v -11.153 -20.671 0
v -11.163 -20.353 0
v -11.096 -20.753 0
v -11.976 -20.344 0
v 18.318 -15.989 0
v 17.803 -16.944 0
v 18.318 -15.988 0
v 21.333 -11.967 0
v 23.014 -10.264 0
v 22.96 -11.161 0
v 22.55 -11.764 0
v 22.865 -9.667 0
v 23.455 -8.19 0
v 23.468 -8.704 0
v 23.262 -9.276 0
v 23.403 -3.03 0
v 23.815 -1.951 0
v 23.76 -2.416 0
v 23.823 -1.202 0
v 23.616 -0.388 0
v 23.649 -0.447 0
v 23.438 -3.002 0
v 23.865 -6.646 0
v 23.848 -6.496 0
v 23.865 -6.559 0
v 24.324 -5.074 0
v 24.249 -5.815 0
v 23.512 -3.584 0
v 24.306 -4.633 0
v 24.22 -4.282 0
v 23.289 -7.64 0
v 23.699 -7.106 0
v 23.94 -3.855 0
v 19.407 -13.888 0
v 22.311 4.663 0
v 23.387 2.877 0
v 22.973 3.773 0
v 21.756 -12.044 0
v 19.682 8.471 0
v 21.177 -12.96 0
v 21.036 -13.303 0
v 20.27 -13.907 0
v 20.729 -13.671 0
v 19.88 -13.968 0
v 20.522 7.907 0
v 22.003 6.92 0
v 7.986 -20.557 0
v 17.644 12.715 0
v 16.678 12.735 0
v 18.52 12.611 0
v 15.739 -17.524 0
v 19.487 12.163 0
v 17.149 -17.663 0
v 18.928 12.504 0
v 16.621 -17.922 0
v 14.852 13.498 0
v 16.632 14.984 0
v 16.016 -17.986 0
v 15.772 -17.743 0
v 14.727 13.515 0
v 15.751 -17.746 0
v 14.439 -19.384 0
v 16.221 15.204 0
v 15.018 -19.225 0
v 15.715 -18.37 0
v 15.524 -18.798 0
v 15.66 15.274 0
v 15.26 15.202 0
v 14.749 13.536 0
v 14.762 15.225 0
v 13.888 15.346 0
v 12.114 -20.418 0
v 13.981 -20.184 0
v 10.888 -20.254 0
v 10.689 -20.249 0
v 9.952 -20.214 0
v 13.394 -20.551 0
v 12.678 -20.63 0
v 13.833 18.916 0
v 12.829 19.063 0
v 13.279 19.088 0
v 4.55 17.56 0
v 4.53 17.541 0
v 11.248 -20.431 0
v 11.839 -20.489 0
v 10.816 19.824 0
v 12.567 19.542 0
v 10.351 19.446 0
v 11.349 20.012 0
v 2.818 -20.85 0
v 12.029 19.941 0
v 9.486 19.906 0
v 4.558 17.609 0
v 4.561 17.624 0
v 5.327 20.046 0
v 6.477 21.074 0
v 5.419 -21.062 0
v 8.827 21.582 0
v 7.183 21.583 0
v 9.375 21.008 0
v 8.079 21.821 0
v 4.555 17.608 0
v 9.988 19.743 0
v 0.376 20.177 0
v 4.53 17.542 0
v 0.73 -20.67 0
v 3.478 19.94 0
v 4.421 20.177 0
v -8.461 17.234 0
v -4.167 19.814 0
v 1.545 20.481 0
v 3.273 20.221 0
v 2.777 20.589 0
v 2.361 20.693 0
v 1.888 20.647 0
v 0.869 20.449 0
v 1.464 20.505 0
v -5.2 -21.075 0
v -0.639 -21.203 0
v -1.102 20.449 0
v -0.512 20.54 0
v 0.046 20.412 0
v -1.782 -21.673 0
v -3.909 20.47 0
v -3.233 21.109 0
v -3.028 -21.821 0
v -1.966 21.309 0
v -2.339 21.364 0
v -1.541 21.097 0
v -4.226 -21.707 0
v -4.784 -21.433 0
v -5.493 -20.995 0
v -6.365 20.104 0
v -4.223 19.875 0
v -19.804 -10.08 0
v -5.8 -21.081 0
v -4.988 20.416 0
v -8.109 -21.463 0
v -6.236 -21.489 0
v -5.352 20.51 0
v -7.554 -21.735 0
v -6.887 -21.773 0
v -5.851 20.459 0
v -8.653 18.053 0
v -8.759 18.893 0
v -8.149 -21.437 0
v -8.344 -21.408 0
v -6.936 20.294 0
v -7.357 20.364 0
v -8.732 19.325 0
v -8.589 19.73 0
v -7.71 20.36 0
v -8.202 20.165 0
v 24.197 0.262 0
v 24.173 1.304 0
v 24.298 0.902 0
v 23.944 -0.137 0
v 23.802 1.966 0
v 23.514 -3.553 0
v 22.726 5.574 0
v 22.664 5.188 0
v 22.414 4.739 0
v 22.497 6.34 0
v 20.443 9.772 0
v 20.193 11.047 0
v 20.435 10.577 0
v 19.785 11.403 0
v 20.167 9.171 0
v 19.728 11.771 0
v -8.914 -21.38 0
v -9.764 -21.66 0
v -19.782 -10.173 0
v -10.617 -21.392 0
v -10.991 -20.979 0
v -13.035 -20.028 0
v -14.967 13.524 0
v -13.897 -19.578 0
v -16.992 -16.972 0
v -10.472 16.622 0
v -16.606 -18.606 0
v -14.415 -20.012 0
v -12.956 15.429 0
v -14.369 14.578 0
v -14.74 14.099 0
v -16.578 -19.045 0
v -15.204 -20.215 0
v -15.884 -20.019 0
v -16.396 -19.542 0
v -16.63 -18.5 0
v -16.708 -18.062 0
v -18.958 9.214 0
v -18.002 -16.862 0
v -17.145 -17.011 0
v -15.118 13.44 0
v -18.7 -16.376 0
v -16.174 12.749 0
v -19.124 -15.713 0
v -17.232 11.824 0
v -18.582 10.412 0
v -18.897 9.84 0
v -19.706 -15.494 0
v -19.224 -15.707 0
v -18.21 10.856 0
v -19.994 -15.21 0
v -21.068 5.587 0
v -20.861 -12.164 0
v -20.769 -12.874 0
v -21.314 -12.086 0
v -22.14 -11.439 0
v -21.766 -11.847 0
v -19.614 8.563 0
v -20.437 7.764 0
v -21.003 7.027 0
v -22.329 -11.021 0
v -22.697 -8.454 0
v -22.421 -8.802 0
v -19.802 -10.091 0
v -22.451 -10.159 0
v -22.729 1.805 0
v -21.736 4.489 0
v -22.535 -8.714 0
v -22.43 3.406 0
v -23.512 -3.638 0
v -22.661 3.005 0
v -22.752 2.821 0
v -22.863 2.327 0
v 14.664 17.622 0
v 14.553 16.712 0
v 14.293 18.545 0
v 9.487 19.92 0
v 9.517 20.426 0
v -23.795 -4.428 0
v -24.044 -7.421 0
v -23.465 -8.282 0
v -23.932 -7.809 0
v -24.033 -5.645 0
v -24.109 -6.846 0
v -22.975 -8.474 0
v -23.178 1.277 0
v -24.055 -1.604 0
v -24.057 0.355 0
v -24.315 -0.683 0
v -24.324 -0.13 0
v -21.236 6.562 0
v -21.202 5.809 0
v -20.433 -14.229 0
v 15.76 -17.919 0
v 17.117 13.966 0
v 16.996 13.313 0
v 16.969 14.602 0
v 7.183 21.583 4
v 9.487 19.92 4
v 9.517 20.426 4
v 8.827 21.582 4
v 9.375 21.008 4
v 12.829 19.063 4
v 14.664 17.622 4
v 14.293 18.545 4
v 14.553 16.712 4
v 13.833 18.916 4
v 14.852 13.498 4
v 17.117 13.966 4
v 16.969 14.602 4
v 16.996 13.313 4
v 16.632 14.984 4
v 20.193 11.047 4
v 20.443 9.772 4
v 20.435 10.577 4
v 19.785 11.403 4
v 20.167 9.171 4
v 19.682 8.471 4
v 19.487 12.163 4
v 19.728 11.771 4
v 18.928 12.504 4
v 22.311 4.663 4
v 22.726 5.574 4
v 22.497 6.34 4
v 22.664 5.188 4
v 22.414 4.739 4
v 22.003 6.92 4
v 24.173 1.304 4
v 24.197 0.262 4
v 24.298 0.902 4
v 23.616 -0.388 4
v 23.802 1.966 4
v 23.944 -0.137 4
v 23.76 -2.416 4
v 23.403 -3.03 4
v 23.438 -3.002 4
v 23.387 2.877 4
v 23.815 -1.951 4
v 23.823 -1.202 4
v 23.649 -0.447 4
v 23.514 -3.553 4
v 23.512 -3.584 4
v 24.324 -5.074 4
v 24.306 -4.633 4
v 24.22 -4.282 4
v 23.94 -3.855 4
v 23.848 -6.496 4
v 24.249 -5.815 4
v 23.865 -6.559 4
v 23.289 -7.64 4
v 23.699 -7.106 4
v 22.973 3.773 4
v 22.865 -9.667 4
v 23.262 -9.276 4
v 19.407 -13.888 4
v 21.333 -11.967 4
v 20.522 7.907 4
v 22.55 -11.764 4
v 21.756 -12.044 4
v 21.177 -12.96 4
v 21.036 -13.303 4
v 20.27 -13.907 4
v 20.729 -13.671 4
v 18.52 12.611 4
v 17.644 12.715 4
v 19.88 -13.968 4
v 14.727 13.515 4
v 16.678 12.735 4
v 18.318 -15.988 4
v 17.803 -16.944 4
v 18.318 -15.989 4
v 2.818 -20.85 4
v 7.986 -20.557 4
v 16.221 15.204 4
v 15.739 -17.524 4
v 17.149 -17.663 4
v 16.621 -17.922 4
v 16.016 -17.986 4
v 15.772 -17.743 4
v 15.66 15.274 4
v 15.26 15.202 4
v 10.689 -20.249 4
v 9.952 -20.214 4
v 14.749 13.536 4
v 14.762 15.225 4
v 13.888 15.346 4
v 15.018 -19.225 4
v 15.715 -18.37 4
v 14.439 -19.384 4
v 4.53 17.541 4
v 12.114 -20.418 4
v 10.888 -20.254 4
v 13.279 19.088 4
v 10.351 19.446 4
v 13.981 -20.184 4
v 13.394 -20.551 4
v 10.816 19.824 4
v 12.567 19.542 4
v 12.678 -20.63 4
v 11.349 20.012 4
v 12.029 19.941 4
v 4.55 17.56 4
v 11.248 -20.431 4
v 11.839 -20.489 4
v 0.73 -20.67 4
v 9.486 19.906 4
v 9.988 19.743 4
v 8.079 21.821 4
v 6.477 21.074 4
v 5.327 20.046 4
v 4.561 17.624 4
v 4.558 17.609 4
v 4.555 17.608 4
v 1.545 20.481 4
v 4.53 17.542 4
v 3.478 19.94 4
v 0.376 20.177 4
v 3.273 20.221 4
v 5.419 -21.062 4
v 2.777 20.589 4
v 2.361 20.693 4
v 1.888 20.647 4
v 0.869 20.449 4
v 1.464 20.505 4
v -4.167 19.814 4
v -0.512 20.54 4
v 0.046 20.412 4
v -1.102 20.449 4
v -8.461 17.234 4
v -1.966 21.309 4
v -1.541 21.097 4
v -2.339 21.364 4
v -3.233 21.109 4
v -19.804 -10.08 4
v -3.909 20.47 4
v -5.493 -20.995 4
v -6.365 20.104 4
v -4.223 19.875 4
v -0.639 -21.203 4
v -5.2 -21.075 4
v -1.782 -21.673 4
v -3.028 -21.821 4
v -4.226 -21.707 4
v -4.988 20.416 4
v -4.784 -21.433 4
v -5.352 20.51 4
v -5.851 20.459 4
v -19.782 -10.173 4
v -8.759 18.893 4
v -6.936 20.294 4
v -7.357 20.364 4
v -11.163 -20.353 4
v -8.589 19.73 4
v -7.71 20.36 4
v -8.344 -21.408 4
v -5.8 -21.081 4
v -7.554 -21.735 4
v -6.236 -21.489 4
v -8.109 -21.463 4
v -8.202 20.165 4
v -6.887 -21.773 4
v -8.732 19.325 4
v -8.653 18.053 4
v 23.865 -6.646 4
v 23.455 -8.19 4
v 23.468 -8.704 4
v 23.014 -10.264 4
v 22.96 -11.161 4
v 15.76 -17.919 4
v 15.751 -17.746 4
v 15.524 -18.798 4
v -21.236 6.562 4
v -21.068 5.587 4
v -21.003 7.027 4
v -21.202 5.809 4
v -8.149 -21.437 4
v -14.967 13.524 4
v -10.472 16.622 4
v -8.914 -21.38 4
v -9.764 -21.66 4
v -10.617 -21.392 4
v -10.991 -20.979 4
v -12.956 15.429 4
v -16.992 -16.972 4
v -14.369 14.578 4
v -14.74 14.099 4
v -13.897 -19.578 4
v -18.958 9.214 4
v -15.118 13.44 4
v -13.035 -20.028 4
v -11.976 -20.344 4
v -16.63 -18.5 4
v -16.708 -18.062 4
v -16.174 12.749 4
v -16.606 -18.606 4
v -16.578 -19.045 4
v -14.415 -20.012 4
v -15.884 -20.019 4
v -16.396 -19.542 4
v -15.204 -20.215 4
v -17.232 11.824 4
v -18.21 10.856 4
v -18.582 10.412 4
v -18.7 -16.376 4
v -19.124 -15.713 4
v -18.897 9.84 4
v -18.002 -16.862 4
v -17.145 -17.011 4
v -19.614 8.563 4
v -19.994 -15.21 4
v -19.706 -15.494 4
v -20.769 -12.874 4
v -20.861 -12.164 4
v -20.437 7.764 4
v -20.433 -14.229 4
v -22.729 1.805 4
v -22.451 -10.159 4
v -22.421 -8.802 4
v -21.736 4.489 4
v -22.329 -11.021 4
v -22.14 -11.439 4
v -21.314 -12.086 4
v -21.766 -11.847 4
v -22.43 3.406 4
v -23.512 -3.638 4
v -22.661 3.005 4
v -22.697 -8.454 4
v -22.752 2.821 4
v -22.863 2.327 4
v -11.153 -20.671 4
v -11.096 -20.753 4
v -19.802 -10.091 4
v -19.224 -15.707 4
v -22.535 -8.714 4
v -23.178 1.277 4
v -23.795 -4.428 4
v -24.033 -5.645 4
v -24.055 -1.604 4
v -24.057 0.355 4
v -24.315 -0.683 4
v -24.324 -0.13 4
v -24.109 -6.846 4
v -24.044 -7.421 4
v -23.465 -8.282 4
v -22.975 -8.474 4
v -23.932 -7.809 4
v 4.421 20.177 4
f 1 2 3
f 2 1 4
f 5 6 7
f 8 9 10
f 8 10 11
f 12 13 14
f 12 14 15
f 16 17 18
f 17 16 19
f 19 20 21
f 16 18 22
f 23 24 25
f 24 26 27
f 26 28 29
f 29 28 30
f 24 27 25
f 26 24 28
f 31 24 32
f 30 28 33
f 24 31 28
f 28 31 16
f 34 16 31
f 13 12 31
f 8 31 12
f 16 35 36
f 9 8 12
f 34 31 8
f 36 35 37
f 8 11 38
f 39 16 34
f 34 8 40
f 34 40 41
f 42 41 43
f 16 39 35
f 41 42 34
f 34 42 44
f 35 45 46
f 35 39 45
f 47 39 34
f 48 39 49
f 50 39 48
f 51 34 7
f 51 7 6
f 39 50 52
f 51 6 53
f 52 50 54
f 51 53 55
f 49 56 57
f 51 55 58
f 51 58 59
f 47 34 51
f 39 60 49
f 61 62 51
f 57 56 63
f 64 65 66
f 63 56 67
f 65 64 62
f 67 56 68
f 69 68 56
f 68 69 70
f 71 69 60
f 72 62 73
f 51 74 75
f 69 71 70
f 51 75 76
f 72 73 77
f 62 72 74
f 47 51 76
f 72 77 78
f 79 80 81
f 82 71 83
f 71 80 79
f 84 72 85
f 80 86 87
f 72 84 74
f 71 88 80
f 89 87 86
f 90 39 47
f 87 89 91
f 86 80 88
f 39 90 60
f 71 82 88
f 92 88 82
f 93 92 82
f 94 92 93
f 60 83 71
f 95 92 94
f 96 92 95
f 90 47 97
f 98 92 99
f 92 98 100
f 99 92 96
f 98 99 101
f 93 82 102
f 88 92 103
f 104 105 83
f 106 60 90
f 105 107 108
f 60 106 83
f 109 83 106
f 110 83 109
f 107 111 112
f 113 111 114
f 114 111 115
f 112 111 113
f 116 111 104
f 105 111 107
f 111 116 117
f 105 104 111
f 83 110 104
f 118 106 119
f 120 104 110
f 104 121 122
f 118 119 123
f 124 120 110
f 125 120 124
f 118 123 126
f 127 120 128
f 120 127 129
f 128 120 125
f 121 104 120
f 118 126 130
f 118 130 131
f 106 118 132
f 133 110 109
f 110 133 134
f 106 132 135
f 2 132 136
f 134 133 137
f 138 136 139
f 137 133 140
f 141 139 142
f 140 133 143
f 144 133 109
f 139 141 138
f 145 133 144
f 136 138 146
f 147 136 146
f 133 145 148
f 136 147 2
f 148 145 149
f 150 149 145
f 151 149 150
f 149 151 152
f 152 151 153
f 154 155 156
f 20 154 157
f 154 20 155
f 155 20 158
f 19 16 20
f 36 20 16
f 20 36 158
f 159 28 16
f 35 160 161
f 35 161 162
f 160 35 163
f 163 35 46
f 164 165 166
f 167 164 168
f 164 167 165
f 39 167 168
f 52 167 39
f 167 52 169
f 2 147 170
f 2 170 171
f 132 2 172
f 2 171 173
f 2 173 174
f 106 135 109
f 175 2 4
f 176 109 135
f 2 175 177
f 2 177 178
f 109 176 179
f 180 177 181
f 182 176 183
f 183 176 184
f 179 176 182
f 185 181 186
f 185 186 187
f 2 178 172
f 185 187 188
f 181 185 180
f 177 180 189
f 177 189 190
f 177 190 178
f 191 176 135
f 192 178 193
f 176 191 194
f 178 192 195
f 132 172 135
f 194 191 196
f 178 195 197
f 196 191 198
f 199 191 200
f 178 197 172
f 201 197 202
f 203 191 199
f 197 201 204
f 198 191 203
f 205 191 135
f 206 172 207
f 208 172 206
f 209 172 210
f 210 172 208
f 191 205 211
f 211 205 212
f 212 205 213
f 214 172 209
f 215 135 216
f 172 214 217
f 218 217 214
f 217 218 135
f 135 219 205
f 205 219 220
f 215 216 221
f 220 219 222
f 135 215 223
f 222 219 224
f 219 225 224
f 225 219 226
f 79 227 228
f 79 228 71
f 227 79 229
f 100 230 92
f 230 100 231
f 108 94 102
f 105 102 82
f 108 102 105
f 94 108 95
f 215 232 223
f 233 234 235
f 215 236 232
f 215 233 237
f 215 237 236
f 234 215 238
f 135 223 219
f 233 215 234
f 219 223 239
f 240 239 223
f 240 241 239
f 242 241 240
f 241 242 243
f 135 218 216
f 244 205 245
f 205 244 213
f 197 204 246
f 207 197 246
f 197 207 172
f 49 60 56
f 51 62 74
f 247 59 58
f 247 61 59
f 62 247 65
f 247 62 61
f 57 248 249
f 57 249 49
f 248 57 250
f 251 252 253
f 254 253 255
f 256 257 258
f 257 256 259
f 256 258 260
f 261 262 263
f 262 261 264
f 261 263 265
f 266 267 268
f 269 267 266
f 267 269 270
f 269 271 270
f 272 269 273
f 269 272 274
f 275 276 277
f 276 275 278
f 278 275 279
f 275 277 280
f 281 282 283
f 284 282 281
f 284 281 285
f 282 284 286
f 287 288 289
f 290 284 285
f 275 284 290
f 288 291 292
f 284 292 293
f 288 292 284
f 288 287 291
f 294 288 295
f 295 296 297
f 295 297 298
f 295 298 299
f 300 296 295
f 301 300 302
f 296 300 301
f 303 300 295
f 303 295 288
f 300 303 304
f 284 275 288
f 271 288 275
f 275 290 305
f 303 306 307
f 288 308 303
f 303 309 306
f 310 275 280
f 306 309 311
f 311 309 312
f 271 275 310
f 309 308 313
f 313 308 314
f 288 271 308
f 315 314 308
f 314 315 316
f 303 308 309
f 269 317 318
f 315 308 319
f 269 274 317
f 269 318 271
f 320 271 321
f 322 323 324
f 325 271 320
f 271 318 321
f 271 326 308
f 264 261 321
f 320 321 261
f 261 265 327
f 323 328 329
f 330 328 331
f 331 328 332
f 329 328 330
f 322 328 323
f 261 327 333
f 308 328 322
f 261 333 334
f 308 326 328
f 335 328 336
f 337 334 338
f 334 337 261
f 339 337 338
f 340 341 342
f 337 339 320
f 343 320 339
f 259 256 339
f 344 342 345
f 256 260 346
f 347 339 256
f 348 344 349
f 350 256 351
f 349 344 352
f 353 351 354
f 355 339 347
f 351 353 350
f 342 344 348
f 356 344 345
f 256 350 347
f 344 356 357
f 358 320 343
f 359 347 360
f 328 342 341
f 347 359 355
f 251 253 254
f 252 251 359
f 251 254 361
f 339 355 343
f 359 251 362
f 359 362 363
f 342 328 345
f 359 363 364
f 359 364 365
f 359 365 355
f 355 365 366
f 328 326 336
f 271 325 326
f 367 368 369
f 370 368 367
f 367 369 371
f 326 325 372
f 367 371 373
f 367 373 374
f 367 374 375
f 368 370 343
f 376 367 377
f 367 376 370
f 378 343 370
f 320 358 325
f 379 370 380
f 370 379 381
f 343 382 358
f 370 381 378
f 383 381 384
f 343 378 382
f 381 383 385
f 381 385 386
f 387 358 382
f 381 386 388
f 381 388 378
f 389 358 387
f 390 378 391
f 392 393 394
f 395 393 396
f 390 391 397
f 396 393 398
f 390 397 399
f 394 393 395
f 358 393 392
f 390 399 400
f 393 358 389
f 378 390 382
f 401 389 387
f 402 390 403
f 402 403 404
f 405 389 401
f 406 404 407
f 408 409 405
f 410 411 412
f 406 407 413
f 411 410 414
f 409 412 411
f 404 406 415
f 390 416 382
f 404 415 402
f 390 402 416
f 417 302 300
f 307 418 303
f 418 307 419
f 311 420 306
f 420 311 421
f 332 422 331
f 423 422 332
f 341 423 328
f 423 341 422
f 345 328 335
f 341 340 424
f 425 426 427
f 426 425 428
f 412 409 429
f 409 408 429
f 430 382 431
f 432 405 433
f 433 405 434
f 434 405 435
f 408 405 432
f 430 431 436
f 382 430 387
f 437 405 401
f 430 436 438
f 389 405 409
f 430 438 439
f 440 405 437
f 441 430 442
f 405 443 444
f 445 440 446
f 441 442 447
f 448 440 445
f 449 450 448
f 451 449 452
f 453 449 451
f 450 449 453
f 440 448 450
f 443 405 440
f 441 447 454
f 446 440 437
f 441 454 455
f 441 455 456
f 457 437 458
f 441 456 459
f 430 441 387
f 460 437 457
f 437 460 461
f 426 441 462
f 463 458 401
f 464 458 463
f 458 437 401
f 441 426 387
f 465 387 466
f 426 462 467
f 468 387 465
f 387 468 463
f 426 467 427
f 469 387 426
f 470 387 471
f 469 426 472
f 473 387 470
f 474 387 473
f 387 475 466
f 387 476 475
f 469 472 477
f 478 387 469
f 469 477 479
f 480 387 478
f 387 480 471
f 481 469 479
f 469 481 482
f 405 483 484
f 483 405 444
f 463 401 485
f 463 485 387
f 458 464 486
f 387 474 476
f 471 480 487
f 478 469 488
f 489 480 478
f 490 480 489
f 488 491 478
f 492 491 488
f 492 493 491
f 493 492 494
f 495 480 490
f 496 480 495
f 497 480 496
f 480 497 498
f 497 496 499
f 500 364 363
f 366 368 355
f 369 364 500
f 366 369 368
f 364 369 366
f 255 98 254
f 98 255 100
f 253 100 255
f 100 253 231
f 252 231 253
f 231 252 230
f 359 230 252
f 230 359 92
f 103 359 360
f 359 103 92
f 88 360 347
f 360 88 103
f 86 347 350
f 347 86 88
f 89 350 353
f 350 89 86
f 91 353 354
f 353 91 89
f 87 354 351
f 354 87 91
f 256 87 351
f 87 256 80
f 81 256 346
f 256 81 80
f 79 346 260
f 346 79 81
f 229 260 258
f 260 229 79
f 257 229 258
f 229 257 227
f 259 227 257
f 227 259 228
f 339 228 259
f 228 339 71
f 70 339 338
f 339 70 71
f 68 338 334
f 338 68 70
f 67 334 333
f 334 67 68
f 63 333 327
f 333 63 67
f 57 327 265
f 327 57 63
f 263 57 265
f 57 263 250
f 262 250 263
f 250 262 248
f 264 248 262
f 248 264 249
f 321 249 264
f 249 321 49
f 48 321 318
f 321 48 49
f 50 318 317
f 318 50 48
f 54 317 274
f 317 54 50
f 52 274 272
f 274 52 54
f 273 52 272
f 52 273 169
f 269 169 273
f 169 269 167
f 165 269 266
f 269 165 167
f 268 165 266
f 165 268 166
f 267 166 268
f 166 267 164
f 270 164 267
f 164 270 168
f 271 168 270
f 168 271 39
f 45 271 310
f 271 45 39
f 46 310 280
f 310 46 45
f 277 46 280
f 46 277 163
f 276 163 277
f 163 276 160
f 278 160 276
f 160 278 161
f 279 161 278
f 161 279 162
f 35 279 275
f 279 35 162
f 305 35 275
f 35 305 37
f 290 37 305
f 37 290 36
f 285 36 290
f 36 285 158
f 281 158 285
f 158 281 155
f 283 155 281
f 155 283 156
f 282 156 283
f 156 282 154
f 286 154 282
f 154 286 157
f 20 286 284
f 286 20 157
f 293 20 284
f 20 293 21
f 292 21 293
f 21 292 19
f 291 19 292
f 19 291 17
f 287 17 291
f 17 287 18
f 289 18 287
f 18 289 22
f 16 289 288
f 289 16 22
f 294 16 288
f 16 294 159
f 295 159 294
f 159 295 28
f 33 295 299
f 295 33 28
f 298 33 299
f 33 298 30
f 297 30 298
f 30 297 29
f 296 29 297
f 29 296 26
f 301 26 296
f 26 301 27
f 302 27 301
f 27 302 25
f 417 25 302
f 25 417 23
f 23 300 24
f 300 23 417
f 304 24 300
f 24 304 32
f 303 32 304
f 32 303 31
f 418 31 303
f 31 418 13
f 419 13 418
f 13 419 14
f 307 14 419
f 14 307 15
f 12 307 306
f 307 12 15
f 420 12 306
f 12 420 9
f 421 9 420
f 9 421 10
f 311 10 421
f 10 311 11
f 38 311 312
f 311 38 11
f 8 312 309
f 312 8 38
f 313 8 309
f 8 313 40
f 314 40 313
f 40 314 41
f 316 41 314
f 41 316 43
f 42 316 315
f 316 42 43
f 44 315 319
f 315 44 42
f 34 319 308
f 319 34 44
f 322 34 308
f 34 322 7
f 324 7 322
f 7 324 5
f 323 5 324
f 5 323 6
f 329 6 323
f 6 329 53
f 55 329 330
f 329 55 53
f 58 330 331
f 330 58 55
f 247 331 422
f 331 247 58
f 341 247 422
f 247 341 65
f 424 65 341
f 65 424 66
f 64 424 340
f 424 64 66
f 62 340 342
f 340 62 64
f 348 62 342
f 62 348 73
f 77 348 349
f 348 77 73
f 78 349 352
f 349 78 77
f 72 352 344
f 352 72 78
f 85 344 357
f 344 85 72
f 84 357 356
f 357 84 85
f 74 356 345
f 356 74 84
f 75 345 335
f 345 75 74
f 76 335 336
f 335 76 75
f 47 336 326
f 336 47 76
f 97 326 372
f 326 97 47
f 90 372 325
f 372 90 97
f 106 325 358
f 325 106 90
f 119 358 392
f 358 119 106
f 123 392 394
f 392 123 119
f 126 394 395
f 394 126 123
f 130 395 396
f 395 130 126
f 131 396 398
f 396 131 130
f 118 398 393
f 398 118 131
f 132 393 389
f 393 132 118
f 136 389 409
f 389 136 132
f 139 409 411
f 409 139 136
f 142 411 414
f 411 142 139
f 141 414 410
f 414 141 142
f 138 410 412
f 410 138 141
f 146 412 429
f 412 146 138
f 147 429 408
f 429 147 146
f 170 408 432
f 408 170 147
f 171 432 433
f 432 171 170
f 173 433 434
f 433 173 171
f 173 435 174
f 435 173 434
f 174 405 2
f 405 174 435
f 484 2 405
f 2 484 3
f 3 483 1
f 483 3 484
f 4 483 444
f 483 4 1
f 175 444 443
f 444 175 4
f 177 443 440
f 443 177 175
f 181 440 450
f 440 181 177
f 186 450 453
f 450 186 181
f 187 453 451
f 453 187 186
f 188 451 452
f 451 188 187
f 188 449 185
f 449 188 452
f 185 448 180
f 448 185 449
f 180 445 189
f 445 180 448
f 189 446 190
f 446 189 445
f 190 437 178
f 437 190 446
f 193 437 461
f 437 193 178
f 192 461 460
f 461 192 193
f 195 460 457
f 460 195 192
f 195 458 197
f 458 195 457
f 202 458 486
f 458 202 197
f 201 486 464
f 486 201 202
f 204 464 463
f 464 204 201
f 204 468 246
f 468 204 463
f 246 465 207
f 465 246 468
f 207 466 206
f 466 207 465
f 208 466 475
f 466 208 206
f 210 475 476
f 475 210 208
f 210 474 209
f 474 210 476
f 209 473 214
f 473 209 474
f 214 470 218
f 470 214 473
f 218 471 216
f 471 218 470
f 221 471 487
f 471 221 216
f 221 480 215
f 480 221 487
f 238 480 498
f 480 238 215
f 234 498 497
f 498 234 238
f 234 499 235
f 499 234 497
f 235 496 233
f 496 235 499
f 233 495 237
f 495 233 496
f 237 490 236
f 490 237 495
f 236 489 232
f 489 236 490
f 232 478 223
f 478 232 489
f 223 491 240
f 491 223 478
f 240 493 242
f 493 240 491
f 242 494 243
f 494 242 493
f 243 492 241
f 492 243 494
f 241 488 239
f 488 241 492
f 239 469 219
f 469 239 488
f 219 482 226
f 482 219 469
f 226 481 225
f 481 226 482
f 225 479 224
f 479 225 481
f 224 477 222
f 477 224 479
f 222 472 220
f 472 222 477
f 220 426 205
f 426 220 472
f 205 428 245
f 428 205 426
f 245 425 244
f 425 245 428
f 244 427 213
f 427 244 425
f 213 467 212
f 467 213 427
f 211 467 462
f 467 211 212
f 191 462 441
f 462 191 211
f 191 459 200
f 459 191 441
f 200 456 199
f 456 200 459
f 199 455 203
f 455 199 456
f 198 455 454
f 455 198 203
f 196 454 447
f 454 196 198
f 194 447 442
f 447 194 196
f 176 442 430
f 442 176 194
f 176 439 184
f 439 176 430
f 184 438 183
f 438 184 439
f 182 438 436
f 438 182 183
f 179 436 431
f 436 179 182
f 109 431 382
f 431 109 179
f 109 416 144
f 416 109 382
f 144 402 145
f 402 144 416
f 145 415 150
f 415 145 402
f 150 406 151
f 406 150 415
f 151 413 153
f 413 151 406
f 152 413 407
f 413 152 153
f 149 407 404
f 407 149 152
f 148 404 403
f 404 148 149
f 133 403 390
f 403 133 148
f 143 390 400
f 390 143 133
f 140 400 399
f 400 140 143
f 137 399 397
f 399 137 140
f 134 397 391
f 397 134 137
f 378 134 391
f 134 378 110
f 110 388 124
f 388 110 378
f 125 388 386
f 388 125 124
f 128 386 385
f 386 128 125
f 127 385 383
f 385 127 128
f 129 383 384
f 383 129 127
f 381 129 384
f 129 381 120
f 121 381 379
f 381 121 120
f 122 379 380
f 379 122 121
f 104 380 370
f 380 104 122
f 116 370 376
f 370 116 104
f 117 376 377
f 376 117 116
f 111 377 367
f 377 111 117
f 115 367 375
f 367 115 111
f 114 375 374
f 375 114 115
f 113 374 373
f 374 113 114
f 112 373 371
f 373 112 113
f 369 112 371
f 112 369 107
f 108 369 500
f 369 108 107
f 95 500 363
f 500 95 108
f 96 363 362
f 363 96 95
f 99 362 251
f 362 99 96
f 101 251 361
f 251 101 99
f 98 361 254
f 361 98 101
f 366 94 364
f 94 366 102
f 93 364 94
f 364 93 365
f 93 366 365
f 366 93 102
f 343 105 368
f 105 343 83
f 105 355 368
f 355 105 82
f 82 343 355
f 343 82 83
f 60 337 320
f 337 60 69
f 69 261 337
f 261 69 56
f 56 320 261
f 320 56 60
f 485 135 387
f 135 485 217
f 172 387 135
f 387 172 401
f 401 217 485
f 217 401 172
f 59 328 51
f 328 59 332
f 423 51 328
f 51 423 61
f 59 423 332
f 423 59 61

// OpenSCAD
// Module names are of the form poly_<inkscape-path-id>().  As a result,
// you can associate a polygon in this OpenSCAD program with the corresponding
// SVG element in the Inkscape document by looking for the XML element with
// the attribute id="inkscape-path-id".

// fudge value is used to ensure that subtracted solids are a tad taller
// in the z dimension than the polygon being subtracted from.  This helps
// keep the resulting .stl file manifold.
fudge = 0.1;

module poly_path4214(h)
{
  scale([25.4/90, -25.4/90, 1]) union()
  {
    linear_extrude(height=h)
      polygon([[-22.317605,-3.653253],[-20.591271,-5.072751],[-18.659748,-5.662958],[-16.687103,-5.546450],[-14.837400,-4.845800],[-12.163087,-2.182368],[-11.666608,-0.464734],[-11.949335,1.346747],[-13.639689,4.512762],[-15.633470,6.518622],[-17.814750,7.376043],[-20.067605,7.096747],[-22.273186,5.645575],[-23.886655,3.174872],[-24.153099,-0.022394],[-22.317605,-3.653253]]);
  }
}

module poly_path42135(h)
{
  scale([25.4/90, -25.4/90, 1]) union()
  {
    difference()
    {
       linear_extrude(height=h)
         polygon([[23.215326,-21.173031],[18.721794,-20.652231],[14.571422,-19.238917],[9.761598,-15.975809],[6.257864,-11.615638],[4.118744,-6.283054],[3.402764,-0.102709],[3.721684,3.779578],[4.691030,7.218656],[6.357589,10.324460],[8.768146,13.206926],[12.703877,16.337295],[17.584441,18.491274],[21.022420,19.108582],[25.302234,19.169522],[30.284484,18.554529],[34.318824,16.953111],[37.535937,14.163136],[40.138890,10.170658],[40.138890,10.169704],[41.454382,6.371344],[41.680770,0.479550],[41.083646,-6.321900],[39.261244,-11.865814],[36.051769,-16.250309],[31.466080,-19.542661],[27.605889,-20.839819],[23.215326,-21.173054]]);
       translate([0, 0, -fudge])
         linear_extrude(height=h+2*fudge)
           polygon([[24.062205,-16.353579],[28.743797,-15.419125],[32.130075,-13.172735],[34.623829,-9.938049],[36.229534,-5.635061],[36.951668,-0.183762],[36.985154,4.615017],[35.741452,7.881579],[34.247693,10.306018],[32.396877,12.185134],[30.165211,13.540774],[27.528906,14.394785],[23.916002,14.946966],[20.105474,14.124603],[16.070019,12.740421],[12.792899,10.183699],[10.553151,7.887717],[9.200208,5.638265],[8.533315,2.939465],[8.351719,-0.704559],[8.556397,-5.101179],[9.987712,-8.269601],[14.010300,-12.922829],[18.815121,-15.797378],[24.062205,-16.353579]]);
    }
    difference()
    {
       linear_extrude(height=h)
         polygon([[-18.114766,-20.771490],[-22.740690,-20.421124],[-26.814659,-19.324874],[-30.447211,-17.433800],[-33.748884,-14.698958],[-36.213767,-11.760528],[-37.954798,-8.512890],[-39.073504,-4.725527],[-39.671411,-0.167926],[-39.102907,7.135599],[-37.961663,10.328531],[-36.253174,13.167792],[-33.997263,15.607810],[-31.233026,17.619506],[-24.307471,20.313591],[-19.866592,20.853746],[-15.419578,20.486811],[-11.134161,19.243922],[-7.178077,17.156211],[-3.763574,14.095268],[-1.209656,10.234390],[0.489592,5.833894],[1.340087,1.154096],[1.339611,-3.577764],[0.443068,-8.133039],[-1.408047,-12.249309],[-4.272242,-15.664155],[-7.342919,-17.936483],[-10.627141,-19.526568],[-14.194544,-20.462281],[-18.114766,-20.771490]]);
       translate([0, 0, -fudge])
         linear_extrude(height=h+2*fudge)
           polygon([[-18.165997,-16.163520],[-14.353440,-15.631237],[-10.827293,-14.262083],[-7.774690,-12.105179],[-5.382764,-9.209645],[-4.021211,-6.323176],[-3.604240,-1.920371],[-3.628449,2.631234],[-4.583394,6.109572],[-7.616149,11.041807],[-12.358047,14.530808],[-17.534135,15.926792],[-23.107510,15.630158],[-28.184023,13.765830],[-31.924711,10.616922],[-33.636638,7.680202],[-34.637298,4.415053],[-34.954814,0.969970],[-34.617306,-2.506549],[-33.652896,-5.866008],[-32.089706,-8.959909],[-29.955856,-11.639757],[-27.279467,-13.757054],[-22.835210,-15.631310],[-18.165997,-16.163520]]);
    }
  }
}

module poly_path42145(h)
{
  scale([25.4/90, -25.4/90, 1]) union()
  {
    linear_extrude(height=h)
      polygon([[17.980615,5.242389],[16.486307,3.580388],[15.811422,1.676797],[15.840749,-0.299069],[16.459075,-2.177894],[19.001874,-4.967157],[20.695920,-5.538963],[22.518115,-5.336464],[25.755652,-3.787496],[27.847554,-1.884192],[28.800415,0.257118],[28.620825,2.520105],[27.268417,4.787587],[24.871337,6.508533],[21.688948,6.915836],[17.980615,5.242389]]);
  }
}

module poly_path41883(h)
{
  scale([25.4/90, -25.4/90, 1]) union()
  {
    difference()
    {
       linear_extrude(height=h)
         polygon([[28.627482,-77.317062],[25.451836,-76.476278],[22.949660,-74.670263],[18.873454,-71.030580],[15.663225,-71.494633],[12.323432,-70.655255],[11.597605,-71.650801],[9.840801,-72.952461],[8.367273,-73.320833],[6.689994,-73.157425],[5.476164,-72.569149],[5.188686,-72.654330],[3.078896,-72.458530],[1.331632,-71.491975],[0.163958,-72.326919],[-1.812996,-72.778248],[-3.904297,-72.458238],[-5.459712,-74.751895],[-6.967465,-75.504404],[-8.289287,-75.700413],[-11.454455,-74.795977],[-13.849083,-72.531883],[-14.764805,-70.205394],[-14.962650,-70.422783],[-17.672428,-72.338454],[-18.962688,-72.674183],[-20.733603,-72.491955],[-22.553462,-71.233772],[-24.575620,-71.908114],[-26.068023,-72.157445],[-27.318669,-72.141782],[-29.062644,-71.450271],[-30.434041,-69.909739],[-30.939290,-68.476058],[-31.036873,-66.942813],[-30.661535,-63.968603],[-29.979229,-61.065373],[-37.104209,-58.898137],[-45.907046,-54.667980],[-50.912275,-51.653843],[-52.229202,-49.956128],[-53.031138,-47.920108],[-53.567951,-47.621086],[-57.311139,-45.173509],[-61.059377,-41.896263],[-64.522489,-38.465983],[-65.842783,-36.894586],[-66.956337,-34.866228],[-67.172836,-32.648879],[-69.499325,-30.342801],[-72.415516,-27.511335],[-74.421146,-24.899250],[-75.246839,-23.251920],[-75.125657,-20.583449],[-74.650955,-19.796420],[-77.015596,-15.906520],[-79.475176,-12.068084],[-80.293261,-10.648412],[-80.616237,-9.994473],[-81.009307,-8.243844],[-80.534605,-6.395609],[-82.125522,-4.524305],[-85.242589,-1.256399],[-86.186271,0.461114],[-86.154727,2.420550],[-85.232831,5.683132],[-83.309174,12.888852],[-84.312707,15.688266],[-85.156523,20.003177],[-85.426260,24.257756],[-85.196451,26.295873],[-84.798840,27.671338],[-83.145024,29.345504],[-81.407023,30.026049],[-80.421917,29.954186],[-79.847838,30.877859],[-79.444120,31.189300],[-79.551484,35.994890],[-79.118779,39.049641],[-78.449050,40.531747],[-77.122069,41.978803],[-75.520920,42.825705],[-73.918051,43.100343],[-73.592412,45.617598],[-72.399888,50.418749],[-70.845351,53.892507],[-69.826178,54.900035],[-68.116029,55.653786],[-67.761111,55.677741],[-66.261584,58.026410],[-63.785600,59.747045],[-60.751488,60.274814],[-60.208460,60.136396],[-59.203156,64.000564],[-58.925893,65.549568],[-58.840251,65.925106],[-58.741949,67.481944],[-58.095812,69.244475],[-56.281357,70.933247],[-53.872292,71.629523],[-51.075855,70.907383],[-49.241502,69.372245],[-46.187785,70.966997],[-42.435066,72.083817],[-39.516740,73.244399],[-39.315271,73.535902],[-39.554901,72.116648],[-38.943806,74.334721],[-37.620604,75.798920],[-34.597590,76.749212],[-31.584344,75.756329],[-29.566639,75.854819],[-28.875429,75.956858],[-28.733462,76.050024],[-26.766269,77.012118],[-24.402579,77.148495],[-22.097237,76.141615],[-20.549931,74.696013],[-19.463031,74.390783],[-18.426648,74.673830],[-16.950582,75.944904],[-14.973281,76.915136],[-10.728487,77.317081],[-6.313757,76.795556],[-2.263702,75.127238],[2.585395,73.239075],[9.985403,73.877040],[19.201358,74.628461],[28.298300,72.838018],[35.261776,71.624199],[37.872977,71.748184],[38.578492,71.765279],[39.854424,72.392323],[41.947542,72.598448],[42.924457,72.346457],[44.923536,73.098882],[47.460154,72.818198],[49.537445,71.517723],[51.162957,68.681930],[53.211980,68.120499],[55.005837,66.605661],[55.684588,65.090479],[55.841694,63.491257],[56.750284,63.729939],[58.891983,63.502941],[60.763524,62.585329],[63.080178,60.036270],[64.907147,56.652878],[64.907147,56.651969],[68.766018,49.211117],[70.439459,49.491502],[71.824024,49.278421],[73.448253,48.439171],[74.538226,47.134868],[75.037422,45.921029],[75.590208,42.401131],[77.087064,42.677080],[79.903328,41.682423],[81.354936,39.545816],[81.543923,36.368415],[81.018667,34.253105],[82.424119,32.868037],[83.155057,30.840655],[83.109150,29.018070],[82.519975,27.072230],[83.974440,25.179851],[84.501291,23.016409],[84.561230,23.549845],[84.560758,23.239118],[85.922433,20.604227],[86.186271,17.979238],[86.122397,16.417599],[85.817361,15.171652],[84.825158,13.659884],[83.309676,12.698946],[83.317399,12.588921],[82.922571,10.737138],[83.048547,10.636875],[84.188759,8.560811],[84.383947,6.913784],[84.412136,4.259446],[83.793909,1.582920],[83.680335,1.376180],[84.840746,0.486622],[85.738836,-0.929012],[86.095139,-3.197213],[85.651021,-4.621929],[84.339562,-6.965277],[82.866648,-10.192365],[81.399605,-13.368137],[79.053978,-16.522327],[79.421321,-16.792950],[80.306793,-18.381895],[80.525985,-19.752077],[79.714745,-22.464296],[77.963489,-24.520396],[72.715112,-28.017226],[69.738255,-30.013638],[71.457851,-32.494515],[72.434460,-34.624761],[72.409008,-37.478447],[71.548460,-39.143296],[70.104734,-40.403856],[69.900767,-41.707200],[69.048817,-43.097683],[67.067501,-44.304404],[65.620345,-44.683281],[62.516557,-45.052395],[59.096035,-45.124265],[60.222635,-47.171682],[60.650587,-49.485318],[60.125331,-51.740819],[58.930859,-53.091784],[57.475838,-53.873878],[55.487833,-54.119752],[54.072171,-53.864111],[52.307372,-53.947515],[49.208945,-54.376079],[51.567371,-59.215386],[51.959813,-62.438813],[50.644562,-65.710380],[49.013246,-67.023472],[47.050136,-67.633146],[45.456560,-67.544418],[44.529504,-69.244575],[42.622533,-70.657936],[40.213203,-70.908268],[38.324495,-70.240907],[36.677677,-68.904640],[35.390268,-69.955908],[33.610278,-70.534600],[33.616638,-70.581629],[33.723057,-72.374709],[33.219993,-74.436924],[31.275589,-76.472166],[28.627391,-77.317081]]);
       translate([0, 0, -fudge])
         linear_extrude(height=h+2*fudge)
           polygon([[16.160996,-62.447779],[16.151910,-62.392768],[16.139644,-62.390951],[16.160996,-62.447738]]);
       translate([0, 0, -fudge])
         linear_extrude(height=h+2*fudge)
           polygon([[16.123744,-62.219746],[16.051874,-62.154086],[16.051874,-62.156812],[16.122835,-62.219809]]);
       translate([0, 0, -fudge])
         linear_extrude(height=h+2*fudge)
           polygon([[-16.530467,-62.138113],[-16.583711,-61.860389],[-16.618237,-61.857664],[-16.530422,-62.138050]]);
       translate([0, 0, -fudge])
         linear_extrude(height=h+2*fudge)
           polygon([[23.139600,-62.133570],[24.301959,-60.868287],[23.858295,-59.976556],[23.470583,-58.539043],[23.894638,-56.335987],[25.943417,-54.275688],[27.880348,-53.860435],[29.929127,-54.294323],[31.422440,-54.925188],[32.252936,-55.339555],[33.224480,-53.435551],[34.644208,-52.154167],[36.056792,-51.711407],[35.971612,-51.164831],[36.467991,-49.205409],[37.305194,-48.201271],[38.345120,-47.490545],[39.790505,-46.919128],[43.101905,-46.108144],[45.054827,-45.777181],[44.519804,-44.518112],[44.406793,-43.073901],[44.885375,-41.410804],[46.444334,-39.853604],[46.502029,-39.355828],[47.790309,-36.910803],[50.390157,-35.973463],[55.504517,-36.095909],[55.279141,-34.678014],[55.808150,-32.572641],[57.148655,-30.855550],[58.799017,-30.003747],[58.686352,-29.123551],[59.144440,-27.002838],[60.034154,-25.749167],[61.951596,-23.944413],[64.074016,-22.448434],[63.797169,-21.228402],[64.012584,-19.709402],[64.363265,-19.138823],[64.872575,-18.344693],[66.053560,-16.869126],[69.462543,-13.237429],[72.839589,-9.602180],[71.101366,-8.768127],[69.769436,-6.865372],[69.475854,-5.116910],[69.762811,-2.967632],[70.572033,-1.055780],[73.447390,2.791550],[71.585826,4.734723],[71.241561,6.940538],[72.249551,10.093980],[71.975338,10.386791],[71.277042,12.918240],[72.053432,15.599647],[72.856443,17.013103],[72.064971,17.078763],[69.879586,18.101816],[68.357880,20.980201],[68.556662,23.094606],[69.286867,24.422902],[69.124457,24.856790],[68.899990,26.494736],[68.030424,27.007589],[66.875198,28.712971],[66.448388,30.930321],[66.514079,36.741215],[66.518622,36.972796],[64.843410,37.905345],[63.171741,40.035737],[59.091083,47.651386],[56.466441,52.846496],[54.955365,52.637981],[53.167130,52.953660],[52.368928,53.495108],[51.298837,54.376191],[49.499421,56.350422],[49.419556,56.461334],[48.564209,56.151668],[45.574041,56.496825],[43.690864,58.196236],[43.055885,59.904036],[42.962709,60.776247],[41.180698,60.826074],[39.488944,61.531335],[38.577719,62.507359],[35.639886,62.635129],[29.936890,63.067455],[24.494580,64.372452],[18.676313,65.690380],[12.311120,64.915476],[6.865803,64.150570],[2.222663,64.193860],[-2.129262,65.098392],[-6.700936,66.917213],[-11.266962,68.802714],[-14.680602,66.237252],[-18.617316,65.325406],[-22.012528,65.440941],[-25.312849,66.619082],[-26.228526,66.320951],[-29.098897,66.686516],[-32.382812,65.195861],[-34.399608,65.372433],[-36.345444,64.438999],[-40.139533,63.210983],[-42.868034,62.420956],[-44.140334,61.403564],[-45.904275,59.745211],[-46.828833,59.063769],[-47.389809,58.604198],[-49.217433,58.316666],[-51.035498,58.657387],[-52.617544,53.094051],[-53.773688,50.183725],[-54.948080,48.745642],[-56.942217,47.675343],[-57.594380,47.601698],[-57.931822,45.326832],[-59.573047,43.193618],[-62.066451,42.370257],[-64.045012,42.682537],[-64.697174,42.933641],[-64.486881,40.667491],[-63.899496,38.396015],[-63.776160,37.197281],[-63.855130,36.236343],[-64.079813,35.377439],[-64.953601,34.137001],[-66.217878,33.239913],[-67.026321,33.043854],[-67.920714,32.951578],[-69.111462,33.025224],[-70.548882,33.302057],[-70.217034,32.720883],[-68.962593,30.150370],[-68.945540,27.114953],[-69.261415,26.460132],[-69.092831,26.283557],[-68.388320,25.305760],[-67.948652,24.644644],[-67.686466,22.963302],[-68.287003,20.915424],[-69.452183,19.577384],[-71.256942,18.785030],[-73.837195,18.596039],[-75.422789,18.788583],[-75.101589,17.465627],[-74.359985,15.457594],[-74.080311,12.972365],[-75.358906,6.834951],[-76.358886,2.868744],[-74.356259,0.683336],[-71.188736,-3.073220],[-70.282041,-4.960956],[-69.957940,-7.177205],[-70.250747,-9.189590],[-68.699757,-11.707732],[-65.864831,-16.300663],[-64.847124,-20.461780],[-65.011274,-21.709314],[-63.717601,-22.861024],[-58.770045,-27.834312],[-57.597439,-29.996140],[-57.148957,-32.553831],[-54.755037,-35.087056],[-48.552850,-39.784392],[-46.584757,-40.740393],[-44.790721,-42.172102],[-43.476637,-45.026531],[-43.476637,-45.460415],[-38.209643,-48.152470],[-31.546978,-51.098282],[-27.167281,-52.297911],[-24.031556,-52.836495],[-22.967688,-53.041459],[-22.541787,-53.137288],[-22.249903,-53.218035],[-21.228602,-53.699833],[-21.228602,-53.699833],[-20.321785,-54.473556],[-17.757472,-53.860435],[-15.312094,-54.296985],[-13.352948,-56.312918],[-12.040672,-56.131909],[-10.078430,-56.533549],[-8.425802,-57.552466],[-8.334444,-57.663378],[-6.443782,-57.340781],[-4.758644,-57.603043],[-3.307899,-58.419356],[-1.359383,-57.835514],[1.219058,-58.412255],[1.668038,-58.634078],[3.099248,-57.591508],[5.070842,-57.267646],[7.417110,-57.727488],[9.021935,-58.827508],[10.003303,-57.061791],[11.890721,-55.851992],[13.693539,-55.564040],[15.701477,-56.045843],[16.725457,-56.632342],[18.717404,-58.130097],[23.139691,-62.133570]]);
       translate([0, 0, -fudge])
         linear_extrude(height=h+2*fudge)
           polygon([[52.203838,-50.843631],[52.074273,-50.670608],[52.203838,-50.843631]]);
       translate([0, 0, -fudge])
         linear_extrude(height=h+2*fudge)
           polygon([[52.261488,-47.961698],[52.624378,-47.825946],[52.181623,-47.887167],[52.261488,-47.961698]]);
       translate([0, 0, -fudge])
         linear_extrude(height=h+2*fudge)
           polygon([[48.025552,-39.278635],[49.124900,-39.095854],[48.025552,-39.278635]]);
       translate([0, 0, -fudge])
         linear_extrude(height=h+2*fudge)
           polygon([[-57.521688,-34.369234],[-57.239530,-32.993929],[-57.521688,-34.369234]]);
       translate([0, 0, -fudge])
         linear_extrude(height=h+2*fudge)
           polygon([[-73.839921,-21.278093],[-73.829291,-21.147661],[-73.839921,-21.278093]]);
       translate([0, 0, -fudge])
         linear_extrude(height=h+2*fudge)
           polygon([[80.612346,-6.603126],[80.732098,-6.523270],[80.612346,-6.603126]]);
       translate([0, 0, -fudge])
         linear_extrude(height=h+2*fudge)
           polygon([[79.590183,3.079032],[79.332870,3.116284],[79.590183,3.079032]]);
       translate([0, 0, -fudge])
         linear_extrude(height=h+2*fudge)
           polygon([[79.616986,17.464736],[78.692405,17.690998],[79.616986,17.464736]]);
       translate([0, 0, -fudge])
         linear_extrude(height=h+2*fudge)
           polygon([[-80.561885,20.308517],[-80.755315,20.375062],[-80.561885,20.308517]]);
       translate([0, 0, -fudge])
         linear_extrude(height=h+2*fudge)
           polygon([[83.269062,20.433625],[83.028604,20.628831],[83.269062,20.433625]]);
       translate([0, 0, -fudge])
         linear_extrude(height=h+2*fudge)
           polygon([[-74.168926,23.091959],[-72.870815,23.359034],[-74.168926,23.091959]]);
       translate([0, 0, -fudge])
         linear_extrude(height=h+2*fudge)
           polygon([[75.102431,26.335910],[75.235494,26.398021],[75.102431,26.335910]]);
       translate([0, 0, -fudge])
         linear_extrude(height=h+2*fudge)
           polygon([[-70.170777,35.718161],[-70.095360,36.044685],[-70.164567,35.757203],[-70.170791,35.718179]]);
       translate([0, 0, -fudge])
         linear_extrude(height=h+2*fudge)
           polygon([[-63.933096,46.473946],[-63.869213,46.697545],[-63.933096,46.473946]]);
       translate([0, 0, -fudge])
         linear_extrude(height=h+2*fudge)
           polygon([[52.696430,59.468375],[52.892549,59.722141],[52.696430,59.468375]]);
       translate([0, 0, -fudge])
         linear_extrude(height=h+2*fudge)
           polygon([[55.768280,62.092105],[55.885397,62.868488],[55.809985,62.880908],[55.768189,62.092103]]);
       translate([0, 0, -fudge])
         linear_extrude(height=h+2*fudge)
           polygon([[51.838448,63.572112],[51.758583,63.760218],[51.766761,63.614702],[51.838630,63.572112]]);
       translate([0, 0, -fudge])
         linear_extrude(height=h+2*fudge)
           polygon([[47.903301,64.512644],[48.032821,64.687441],[47.903301,64.512644]]);
       translate([0, 0, -fudge])
         linear_extrude(height=h+2*fudge)
           polygon([[-37.127058,67.332467],[-37.788966,68.429162],[-37.127058,67.332467]]);
       translate([0, 0, -fudge])
         linear_extrude(height=h+2*fudge)
           polygon([[-34.030403,75.035958],[-33.275274,75.263992],[-34.030403,75.035958]]);
    }
  }
}

poly_path4214(4);
poly_path42135(4);
poly_path42145(4);
poly_path41883(4);
